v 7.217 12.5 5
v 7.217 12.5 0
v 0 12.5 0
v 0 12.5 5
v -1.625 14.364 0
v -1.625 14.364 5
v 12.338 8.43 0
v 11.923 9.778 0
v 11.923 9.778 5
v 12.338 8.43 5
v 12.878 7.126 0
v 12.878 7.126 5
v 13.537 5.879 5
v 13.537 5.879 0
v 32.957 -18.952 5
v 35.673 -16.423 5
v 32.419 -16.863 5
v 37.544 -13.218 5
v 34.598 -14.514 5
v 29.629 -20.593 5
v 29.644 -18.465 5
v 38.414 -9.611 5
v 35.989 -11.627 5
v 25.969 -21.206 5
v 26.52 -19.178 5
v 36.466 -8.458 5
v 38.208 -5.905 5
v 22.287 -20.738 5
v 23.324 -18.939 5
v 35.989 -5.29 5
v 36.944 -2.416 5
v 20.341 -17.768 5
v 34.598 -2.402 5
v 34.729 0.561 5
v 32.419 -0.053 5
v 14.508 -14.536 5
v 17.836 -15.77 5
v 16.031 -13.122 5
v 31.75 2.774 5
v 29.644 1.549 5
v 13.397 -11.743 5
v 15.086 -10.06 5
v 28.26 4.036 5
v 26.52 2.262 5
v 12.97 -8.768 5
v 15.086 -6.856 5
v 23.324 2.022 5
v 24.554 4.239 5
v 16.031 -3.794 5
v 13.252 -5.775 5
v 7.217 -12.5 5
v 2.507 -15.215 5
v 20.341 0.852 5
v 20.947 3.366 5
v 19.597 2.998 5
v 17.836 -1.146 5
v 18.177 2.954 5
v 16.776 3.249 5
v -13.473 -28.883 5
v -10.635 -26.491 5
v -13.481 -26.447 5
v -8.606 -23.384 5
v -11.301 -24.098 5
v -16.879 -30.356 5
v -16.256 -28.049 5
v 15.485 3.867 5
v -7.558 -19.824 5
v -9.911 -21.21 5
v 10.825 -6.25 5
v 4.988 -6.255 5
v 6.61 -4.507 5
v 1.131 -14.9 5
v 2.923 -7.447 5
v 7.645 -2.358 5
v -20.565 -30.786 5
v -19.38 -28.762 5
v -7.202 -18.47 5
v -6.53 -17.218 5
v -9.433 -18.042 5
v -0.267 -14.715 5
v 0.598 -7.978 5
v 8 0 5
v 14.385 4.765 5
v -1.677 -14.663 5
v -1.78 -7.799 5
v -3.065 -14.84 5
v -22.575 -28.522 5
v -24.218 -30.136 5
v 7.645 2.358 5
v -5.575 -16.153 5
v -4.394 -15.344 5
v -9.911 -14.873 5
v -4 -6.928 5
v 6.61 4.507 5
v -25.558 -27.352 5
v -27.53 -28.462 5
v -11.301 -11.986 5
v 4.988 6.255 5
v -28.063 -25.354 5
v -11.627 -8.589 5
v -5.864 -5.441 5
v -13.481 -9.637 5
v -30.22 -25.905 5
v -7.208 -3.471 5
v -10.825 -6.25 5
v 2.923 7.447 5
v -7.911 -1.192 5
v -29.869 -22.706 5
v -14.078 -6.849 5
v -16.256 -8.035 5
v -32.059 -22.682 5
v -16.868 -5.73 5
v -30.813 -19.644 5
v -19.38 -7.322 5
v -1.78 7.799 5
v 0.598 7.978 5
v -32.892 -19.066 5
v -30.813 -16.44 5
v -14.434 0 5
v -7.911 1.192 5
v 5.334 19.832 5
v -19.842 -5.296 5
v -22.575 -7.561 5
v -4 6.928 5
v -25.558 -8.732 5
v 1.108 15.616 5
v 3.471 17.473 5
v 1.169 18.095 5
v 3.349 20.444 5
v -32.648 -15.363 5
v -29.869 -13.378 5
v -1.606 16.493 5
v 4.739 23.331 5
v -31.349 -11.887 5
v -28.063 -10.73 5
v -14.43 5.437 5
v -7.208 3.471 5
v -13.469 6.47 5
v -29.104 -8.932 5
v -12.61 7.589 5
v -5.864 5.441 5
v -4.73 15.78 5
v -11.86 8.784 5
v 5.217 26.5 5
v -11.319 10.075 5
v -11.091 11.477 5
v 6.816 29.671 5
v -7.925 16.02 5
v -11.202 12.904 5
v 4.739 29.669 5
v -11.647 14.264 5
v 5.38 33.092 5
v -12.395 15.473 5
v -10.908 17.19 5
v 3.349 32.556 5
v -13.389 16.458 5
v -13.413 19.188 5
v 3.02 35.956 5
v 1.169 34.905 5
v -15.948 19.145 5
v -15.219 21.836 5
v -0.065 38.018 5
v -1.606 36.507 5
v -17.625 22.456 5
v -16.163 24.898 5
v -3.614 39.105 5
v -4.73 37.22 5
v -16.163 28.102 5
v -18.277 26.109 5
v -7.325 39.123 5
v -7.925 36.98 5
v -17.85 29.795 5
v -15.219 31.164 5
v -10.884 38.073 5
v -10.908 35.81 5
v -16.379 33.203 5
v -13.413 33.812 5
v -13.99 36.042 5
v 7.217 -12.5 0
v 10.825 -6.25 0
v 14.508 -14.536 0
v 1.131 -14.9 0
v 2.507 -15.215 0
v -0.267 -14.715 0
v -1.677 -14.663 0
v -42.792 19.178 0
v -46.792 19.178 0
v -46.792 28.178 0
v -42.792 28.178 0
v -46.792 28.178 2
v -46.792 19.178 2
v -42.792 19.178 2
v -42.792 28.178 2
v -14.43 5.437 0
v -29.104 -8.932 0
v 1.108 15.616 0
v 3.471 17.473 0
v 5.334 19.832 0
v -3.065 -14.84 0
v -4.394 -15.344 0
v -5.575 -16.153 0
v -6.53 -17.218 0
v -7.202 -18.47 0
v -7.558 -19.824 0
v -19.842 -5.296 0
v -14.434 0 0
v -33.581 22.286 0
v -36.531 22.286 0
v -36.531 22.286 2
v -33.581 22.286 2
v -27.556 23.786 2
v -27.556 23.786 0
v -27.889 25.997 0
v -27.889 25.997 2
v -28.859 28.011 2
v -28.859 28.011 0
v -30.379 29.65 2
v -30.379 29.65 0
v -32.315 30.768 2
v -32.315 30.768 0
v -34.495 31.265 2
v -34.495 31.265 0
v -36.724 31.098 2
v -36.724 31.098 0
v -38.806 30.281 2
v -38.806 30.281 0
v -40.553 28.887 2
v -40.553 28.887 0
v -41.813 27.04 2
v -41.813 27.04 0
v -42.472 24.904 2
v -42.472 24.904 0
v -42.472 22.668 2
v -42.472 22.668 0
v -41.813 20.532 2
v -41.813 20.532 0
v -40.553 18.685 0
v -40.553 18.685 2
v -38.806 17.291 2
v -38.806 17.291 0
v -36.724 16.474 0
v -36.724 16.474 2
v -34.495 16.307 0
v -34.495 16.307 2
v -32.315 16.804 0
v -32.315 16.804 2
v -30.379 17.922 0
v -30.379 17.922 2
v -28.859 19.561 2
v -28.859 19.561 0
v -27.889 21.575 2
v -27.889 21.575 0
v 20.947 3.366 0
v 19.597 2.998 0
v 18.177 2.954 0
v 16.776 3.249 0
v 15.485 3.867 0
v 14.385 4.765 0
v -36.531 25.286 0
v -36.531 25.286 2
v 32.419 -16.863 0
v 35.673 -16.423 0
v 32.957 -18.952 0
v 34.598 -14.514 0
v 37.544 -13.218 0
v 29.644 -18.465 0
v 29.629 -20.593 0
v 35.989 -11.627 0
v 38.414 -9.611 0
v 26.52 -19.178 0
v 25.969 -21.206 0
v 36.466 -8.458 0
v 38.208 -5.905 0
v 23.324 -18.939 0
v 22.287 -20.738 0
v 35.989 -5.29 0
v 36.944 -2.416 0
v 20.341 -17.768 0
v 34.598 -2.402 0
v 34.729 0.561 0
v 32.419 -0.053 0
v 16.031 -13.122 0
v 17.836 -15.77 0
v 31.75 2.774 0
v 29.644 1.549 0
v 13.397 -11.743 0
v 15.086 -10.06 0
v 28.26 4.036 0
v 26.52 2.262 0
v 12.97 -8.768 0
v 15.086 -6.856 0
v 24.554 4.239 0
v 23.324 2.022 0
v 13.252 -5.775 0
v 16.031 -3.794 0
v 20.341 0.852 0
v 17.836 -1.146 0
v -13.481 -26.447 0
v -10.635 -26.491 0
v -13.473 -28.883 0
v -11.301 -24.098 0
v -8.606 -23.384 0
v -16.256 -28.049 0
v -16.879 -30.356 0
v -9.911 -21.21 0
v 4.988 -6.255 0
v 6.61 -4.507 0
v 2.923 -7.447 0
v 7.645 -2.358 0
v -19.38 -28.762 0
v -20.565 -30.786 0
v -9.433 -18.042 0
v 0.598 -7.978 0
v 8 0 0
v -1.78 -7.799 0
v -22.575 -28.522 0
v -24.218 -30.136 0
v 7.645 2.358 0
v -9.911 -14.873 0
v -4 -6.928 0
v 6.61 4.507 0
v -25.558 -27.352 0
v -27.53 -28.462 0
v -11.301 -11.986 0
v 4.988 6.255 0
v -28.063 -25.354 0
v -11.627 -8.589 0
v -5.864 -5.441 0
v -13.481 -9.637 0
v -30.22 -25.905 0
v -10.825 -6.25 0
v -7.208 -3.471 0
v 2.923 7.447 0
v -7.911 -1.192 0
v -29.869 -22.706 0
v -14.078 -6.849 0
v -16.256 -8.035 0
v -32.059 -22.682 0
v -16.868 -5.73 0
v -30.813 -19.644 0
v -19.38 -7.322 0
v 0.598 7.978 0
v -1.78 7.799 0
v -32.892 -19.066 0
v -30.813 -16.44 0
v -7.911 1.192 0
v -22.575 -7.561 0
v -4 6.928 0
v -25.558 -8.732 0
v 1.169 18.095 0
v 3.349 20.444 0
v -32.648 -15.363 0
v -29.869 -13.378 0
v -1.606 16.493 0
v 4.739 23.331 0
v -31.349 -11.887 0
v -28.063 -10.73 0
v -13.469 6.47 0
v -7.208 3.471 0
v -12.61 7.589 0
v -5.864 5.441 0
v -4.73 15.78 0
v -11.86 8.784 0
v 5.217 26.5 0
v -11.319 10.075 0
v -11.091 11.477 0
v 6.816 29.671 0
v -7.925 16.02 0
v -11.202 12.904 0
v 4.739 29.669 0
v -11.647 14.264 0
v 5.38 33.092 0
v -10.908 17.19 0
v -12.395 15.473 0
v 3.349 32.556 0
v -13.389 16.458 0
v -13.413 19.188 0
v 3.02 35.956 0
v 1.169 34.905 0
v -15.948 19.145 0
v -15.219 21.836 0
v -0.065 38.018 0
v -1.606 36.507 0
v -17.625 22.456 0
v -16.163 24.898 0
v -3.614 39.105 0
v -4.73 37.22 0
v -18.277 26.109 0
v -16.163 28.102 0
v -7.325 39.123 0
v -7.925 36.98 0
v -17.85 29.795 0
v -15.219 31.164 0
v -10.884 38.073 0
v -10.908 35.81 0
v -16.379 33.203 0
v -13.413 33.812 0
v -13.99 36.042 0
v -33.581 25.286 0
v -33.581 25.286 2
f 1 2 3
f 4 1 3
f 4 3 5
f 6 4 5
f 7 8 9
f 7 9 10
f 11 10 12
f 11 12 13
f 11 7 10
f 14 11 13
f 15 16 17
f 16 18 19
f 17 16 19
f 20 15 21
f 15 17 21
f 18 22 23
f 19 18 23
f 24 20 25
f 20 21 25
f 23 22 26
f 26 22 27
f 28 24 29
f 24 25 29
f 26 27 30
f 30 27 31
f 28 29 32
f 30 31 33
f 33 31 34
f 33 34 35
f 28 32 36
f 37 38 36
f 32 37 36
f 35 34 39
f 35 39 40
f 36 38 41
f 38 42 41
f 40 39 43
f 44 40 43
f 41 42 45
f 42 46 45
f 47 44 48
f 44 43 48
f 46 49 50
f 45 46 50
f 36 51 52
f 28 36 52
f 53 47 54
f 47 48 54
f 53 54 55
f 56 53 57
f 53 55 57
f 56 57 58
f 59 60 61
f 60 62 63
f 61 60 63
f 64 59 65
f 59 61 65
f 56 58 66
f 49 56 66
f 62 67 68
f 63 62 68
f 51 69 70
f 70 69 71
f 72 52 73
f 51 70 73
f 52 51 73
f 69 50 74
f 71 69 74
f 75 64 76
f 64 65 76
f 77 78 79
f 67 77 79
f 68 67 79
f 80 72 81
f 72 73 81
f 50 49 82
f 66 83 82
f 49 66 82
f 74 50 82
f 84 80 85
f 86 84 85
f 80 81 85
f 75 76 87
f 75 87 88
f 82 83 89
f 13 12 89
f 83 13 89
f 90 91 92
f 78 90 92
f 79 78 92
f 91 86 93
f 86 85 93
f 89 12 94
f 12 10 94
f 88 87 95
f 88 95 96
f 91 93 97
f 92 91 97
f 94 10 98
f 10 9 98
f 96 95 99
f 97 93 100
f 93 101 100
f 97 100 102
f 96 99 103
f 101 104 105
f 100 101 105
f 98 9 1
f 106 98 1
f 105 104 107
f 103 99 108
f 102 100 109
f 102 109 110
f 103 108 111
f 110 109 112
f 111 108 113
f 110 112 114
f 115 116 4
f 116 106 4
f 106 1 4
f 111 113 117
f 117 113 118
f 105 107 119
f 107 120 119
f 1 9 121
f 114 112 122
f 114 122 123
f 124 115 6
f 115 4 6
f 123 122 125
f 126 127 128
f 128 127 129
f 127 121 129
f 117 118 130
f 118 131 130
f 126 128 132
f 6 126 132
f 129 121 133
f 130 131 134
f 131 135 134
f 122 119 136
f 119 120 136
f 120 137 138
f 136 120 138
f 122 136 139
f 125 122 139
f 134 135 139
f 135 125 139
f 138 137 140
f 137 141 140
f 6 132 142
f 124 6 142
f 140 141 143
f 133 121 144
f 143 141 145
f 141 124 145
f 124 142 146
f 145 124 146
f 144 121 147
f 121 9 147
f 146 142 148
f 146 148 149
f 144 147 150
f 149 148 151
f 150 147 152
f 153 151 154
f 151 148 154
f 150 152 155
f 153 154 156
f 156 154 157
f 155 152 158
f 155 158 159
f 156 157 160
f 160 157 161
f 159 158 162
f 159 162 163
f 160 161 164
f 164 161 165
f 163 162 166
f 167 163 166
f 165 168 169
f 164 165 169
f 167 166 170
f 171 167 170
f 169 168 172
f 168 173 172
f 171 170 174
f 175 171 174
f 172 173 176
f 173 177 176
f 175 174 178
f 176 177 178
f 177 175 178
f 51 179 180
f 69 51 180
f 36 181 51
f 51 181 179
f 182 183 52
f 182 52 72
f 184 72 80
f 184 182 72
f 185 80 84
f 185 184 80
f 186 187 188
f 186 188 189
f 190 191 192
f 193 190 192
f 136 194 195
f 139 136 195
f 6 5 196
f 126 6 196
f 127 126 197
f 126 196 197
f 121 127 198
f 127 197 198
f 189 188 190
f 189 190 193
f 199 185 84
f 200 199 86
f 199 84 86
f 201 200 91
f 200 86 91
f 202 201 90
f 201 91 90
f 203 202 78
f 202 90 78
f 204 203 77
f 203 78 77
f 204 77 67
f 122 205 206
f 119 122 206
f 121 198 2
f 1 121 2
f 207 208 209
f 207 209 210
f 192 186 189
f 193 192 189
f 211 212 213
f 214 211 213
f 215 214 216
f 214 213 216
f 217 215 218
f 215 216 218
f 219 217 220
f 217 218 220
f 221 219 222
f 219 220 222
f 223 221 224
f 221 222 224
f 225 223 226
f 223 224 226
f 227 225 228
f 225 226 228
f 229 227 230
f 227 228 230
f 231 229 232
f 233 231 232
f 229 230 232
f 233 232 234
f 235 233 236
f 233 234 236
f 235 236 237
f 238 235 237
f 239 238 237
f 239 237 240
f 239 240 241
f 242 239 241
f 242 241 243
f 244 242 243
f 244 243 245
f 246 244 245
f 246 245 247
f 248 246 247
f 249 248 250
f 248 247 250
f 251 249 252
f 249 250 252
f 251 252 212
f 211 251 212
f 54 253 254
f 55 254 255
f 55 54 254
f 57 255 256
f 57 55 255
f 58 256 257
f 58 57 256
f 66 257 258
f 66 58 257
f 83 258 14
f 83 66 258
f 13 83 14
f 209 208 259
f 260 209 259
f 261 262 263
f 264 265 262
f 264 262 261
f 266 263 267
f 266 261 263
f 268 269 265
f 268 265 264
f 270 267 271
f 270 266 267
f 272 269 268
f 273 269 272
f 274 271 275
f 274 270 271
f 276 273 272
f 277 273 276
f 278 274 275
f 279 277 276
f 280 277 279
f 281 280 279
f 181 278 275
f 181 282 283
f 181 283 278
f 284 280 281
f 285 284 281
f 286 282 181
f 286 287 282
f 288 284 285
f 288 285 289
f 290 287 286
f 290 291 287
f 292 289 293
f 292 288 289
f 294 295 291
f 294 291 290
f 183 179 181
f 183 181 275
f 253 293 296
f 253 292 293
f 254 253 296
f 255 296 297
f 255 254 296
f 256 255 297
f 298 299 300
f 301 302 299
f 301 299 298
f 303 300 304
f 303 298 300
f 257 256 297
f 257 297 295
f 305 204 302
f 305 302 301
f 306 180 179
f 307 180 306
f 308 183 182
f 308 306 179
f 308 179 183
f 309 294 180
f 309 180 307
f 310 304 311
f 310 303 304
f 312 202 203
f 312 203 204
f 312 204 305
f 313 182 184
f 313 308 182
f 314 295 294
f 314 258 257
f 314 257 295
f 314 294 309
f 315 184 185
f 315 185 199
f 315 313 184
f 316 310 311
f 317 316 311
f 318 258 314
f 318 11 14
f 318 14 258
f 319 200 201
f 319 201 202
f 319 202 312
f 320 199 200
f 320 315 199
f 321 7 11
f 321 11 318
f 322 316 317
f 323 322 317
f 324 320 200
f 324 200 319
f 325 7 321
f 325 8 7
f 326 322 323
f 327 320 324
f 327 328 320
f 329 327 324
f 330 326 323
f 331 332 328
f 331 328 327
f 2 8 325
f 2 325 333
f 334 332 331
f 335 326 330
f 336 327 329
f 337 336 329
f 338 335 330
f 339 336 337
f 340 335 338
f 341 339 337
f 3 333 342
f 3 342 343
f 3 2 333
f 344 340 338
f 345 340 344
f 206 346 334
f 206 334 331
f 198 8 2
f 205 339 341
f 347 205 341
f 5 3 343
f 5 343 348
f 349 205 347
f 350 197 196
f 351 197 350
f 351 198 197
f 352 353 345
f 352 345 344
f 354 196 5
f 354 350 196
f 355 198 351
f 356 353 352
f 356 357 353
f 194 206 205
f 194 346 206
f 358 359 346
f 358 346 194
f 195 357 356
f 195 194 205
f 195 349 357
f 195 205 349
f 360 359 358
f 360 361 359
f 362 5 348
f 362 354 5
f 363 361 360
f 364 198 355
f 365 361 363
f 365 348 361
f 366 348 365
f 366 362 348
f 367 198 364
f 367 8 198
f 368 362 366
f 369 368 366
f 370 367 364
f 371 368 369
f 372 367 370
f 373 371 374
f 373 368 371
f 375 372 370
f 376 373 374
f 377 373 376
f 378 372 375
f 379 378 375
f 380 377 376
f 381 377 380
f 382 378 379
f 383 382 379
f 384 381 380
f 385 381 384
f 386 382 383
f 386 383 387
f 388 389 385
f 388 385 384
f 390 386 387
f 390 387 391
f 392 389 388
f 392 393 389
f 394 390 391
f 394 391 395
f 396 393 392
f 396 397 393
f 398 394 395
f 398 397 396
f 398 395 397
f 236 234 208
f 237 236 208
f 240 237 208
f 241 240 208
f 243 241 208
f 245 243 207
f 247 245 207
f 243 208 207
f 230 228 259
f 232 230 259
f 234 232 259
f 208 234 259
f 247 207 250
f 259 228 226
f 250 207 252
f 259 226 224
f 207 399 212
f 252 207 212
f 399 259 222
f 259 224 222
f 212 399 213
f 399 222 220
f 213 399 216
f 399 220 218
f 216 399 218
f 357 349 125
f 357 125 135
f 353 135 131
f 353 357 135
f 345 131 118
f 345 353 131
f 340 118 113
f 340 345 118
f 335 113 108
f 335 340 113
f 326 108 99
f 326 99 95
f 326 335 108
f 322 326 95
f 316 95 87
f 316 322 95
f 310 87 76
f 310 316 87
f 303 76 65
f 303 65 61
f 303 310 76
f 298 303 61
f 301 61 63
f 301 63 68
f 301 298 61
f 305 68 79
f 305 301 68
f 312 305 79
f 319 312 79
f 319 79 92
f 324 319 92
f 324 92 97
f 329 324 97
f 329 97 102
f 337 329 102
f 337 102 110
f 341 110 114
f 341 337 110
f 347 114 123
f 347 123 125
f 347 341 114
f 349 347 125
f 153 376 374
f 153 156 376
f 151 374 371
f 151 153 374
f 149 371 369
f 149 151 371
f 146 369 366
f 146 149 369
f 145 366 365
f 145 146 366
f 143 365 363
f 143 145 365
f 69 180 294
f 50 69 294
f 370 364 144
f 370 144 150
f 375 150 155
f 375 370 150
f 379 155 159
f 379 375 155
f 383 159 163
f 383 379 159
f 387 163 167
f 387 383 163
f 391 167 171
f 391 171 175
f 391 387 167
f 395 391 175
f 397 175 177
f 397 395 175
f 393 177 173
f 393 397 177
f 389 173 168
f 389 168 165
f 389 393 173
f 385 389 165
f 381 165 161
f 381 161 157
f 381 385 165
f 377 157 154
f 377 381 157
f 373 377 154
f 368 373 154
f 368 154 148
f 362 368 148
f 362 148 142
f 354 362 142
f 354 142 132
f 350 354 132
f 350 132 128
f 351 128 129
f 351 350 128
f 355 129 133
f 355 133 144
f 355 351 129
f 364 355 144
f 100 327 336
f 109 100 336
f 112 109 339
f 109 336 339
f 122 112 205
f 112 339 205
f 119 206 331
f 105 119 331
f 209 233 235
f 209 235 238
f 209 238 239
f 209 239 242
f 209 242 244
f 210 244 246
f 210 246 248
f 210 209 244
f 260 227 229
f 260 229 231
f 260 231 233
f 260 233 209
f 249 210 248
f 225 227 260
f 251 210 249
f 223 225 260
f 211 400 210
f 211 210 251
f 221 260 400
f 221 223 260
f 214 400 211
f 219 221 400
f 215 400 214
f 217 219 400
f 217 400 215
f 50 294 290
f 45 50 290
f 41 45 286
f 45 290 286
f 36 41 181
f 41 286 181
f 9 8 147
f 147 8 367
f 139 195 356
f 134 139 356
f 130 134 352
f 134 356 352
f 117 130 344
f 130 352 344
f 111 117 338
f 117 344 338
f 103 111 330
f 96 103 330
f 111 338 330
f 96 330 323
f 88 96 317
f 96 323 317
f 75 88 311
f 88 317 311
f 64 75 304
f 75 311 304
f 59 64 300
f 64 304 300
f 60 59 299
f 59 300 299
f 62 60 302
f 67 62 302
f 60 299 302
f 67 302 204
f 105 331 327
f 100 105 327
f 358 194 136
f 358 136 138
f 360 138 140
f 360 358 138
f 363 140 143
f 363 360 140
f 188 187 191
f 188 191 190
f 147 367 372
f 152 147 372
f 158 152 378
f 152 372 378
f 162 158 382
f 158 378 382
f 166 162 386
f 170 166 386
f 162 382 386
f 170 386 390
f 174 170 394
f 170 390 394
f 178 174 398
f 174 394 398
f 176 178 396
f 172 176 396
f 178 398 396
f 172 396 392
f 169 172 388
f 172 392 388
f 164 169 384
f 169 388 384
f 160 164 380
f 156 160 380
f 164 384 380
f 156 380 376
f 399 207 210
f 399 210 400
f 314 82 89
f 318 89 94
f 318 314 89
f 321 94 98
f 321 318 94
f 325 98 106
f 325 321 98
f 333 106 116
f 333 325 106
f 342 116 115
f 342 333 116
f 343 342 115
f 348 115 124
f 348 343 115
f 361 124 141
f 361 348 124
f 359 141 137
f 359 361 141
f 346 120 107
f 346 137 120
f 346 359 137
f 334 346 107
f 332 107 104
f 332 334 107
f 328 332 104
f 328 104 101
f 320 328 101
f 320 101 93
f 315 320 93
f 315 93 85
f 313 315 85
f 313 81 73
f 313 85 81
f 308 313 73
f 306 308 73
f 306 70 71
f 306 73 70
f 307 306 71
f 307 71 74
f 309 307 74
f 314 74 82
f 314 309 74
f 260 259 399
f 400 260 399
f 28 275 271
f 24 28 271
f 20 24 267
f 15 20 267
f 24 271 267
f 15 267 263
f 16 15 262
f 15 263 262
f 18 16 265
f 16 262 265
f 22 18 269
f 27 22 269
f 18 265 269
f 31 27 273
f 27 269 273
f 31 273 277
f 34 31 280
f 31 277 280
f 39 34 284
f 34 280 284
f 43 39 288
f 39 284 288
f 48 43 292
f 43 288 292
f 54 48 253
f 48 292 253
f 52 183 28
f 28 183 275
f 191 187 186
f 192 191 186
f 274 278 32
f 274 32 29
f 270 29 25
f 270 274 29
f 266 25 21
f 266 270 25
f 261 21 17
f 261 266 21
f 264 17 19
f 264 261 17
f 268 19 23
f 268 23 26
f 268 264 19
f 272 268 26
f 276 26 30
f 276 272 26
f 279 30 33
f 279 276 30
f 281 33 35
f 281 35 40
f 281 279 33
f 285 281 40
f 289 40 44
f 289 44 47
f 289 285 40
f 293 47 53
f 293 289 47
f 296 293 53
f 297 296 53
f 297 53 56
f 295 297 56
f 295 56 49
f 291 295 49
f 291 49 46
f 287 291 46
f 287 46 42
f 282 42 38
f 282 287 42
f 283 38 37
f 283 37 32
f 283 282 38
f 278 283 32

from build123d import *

# Parameters (mm, degrees)
F0_R        = 8
F1_DEPTH    = 5
F0_R_2      = 10.75
F2_DEPTH    = 5
F3_COUNT    = 3
F4_T1_DEPTH = 5
F5_W        = 4
F5_H        = 9
F6_DEPTH    = 2
F5_R        = 7.5
F5_W_2      = 2.95
F5_H_2      = 3
F7_R        = 6


# Not quite as in the source:
# - a fillet or chamfer that OpenCascade refuses, or shapes differently, is made with other operations: its cross-section is extruded or revolved along the edge and cut away or added
# - a feature names something its author has since deleted; it is built from what else it names


with BuildPart() as f1:
    # F0 (on Top) → F1 (new body)
    with BuildSketch(Plane.XY):
        Polygon((0, 12.5), (-7.2168783649, 12.5), (-14.4337567297, 0), (-7.2168783649, -12.5), (7.2168783649, -12.5), (14.4337567297, 0), (7.2168783649, 12.5), align=None)
        Circle(F0_R, mode=Mode.SUBTRACT)
    extrude(amount=F1_DEPTH)

    # F0 (on Top) → F2 (join)
    with BuildSketch(Plane.XY):
        with BuildLine():
            Line((-10.0093687347, 14.5615867092), (-7.2168783649, 12.5))
            Line((-7.2168783649, 12.5), (0, 12.5))
            Line((0, 12.5), (-1.6247319688, 14.3638148409))
            ThreePointArc((-1.6247319688, 14.3638148409), (2.3445854374, 16.4748201373), (5.3344467629, 19.8322824659))
            Line((5.3344467629, 19.8322824659), (7.2168783649, 12.5))
            Line((7.2168783649, 12.5), (14.4337567297, 0))
            Line((14.4337567297, 0), (6.8163861068, 29.6705139226))
            ThreePointArc((6.8163861068, 29.6705139226), (-14.0517470331, 35.9865969309), (-10.0093687347, 14.5615867092))
        make_face()
        with Locations((-5.5331216351, 26.5)):
            Circle(F0_R_2, mode=Mode.SUBTRACT)
    extrude(amount=F2_DEPTH)

    # F3: F1 ×3 about axis
    f3_axis = Axis((0, 0, 0), (0, 0, 1))


with BuildPart() as f1_1:
    add(f1.part)
    for i in range(1, F3_COUNT):
        add(f1.part.rotate(f3_axis, i * 360 / F3_COUNT))

    # F4: fillet of radius 15 on 3 edges, made by hand

    # F4_s2 → F4_t1 (join)
    with BuildSketch(Plane.XY):
        with BuildLine():
            ThreePointArc((2.5065087004, -15.21505791), (-2.6136621593, -14.7017722607), (-7.6060196422, -15.9491609547))
            Line((-7.6060196422, -15.9491609547), (-7.2168783649, -12.5))
            Line((-7.2168783649, -12.5), (2.5065087004, -15.21505791))
        make_face()
        with BuildLine():
            ThreePointArc((-14.4298810204, 5.4368287457), (-11.4252771788, 9.6143839572), (-10.0093687348, 14.5615867092))
            Line((-10.0093687348, 14.5615867092), (-7.2168783649, 12.5))
            Line((-7.2168783649, 12.5), (-14.4298810204, 5.4368287457))
        make_face()
        with BuildLine():
            ThreePointArc((11.92337232, 9.7782291644), (14.0389393381, 5.0873883035), (17.6153883769, 1.3875742456))
            Line((17.6153883769, 1.3875742456), (14.4337567297, 0))
            Line((14.4337567297, 0), (11.92337232, 9.7782291644))
        make_face()
    extrude(amount=F4_T1_DEPTH)

    # F7
    f7_edges = [f1_1.edges().sort_by_distance(p)[0] for p in [
        (-10.009369, 14.561587, 2.5),
        (17.615388, 1.387574, 2.5),
        (-7.60602, -15.949161, 2.5),
    ]]
    fillet(f7_edges, radius=F7_R)


with BuildPart() as f6:
    # F5 (on Top) → F6 (new body)
    with BuildSketch(Plane.XY):
        with Locations((-44.7917245328, 23.6781613976)):
            Rectangle(F5_W, F5_H)
    extrude(amount=F6_DEPTH)


with BuildPart() as f6b:
    # F5 (on Top) → F6, piece 2 (new body)
    with BuildSketch(Plane.XY):
        with Locations((-35.0555505693, 23.7860276699)):
            Circle(F5_R)
        with Locations((-35.0555505693, 23.7860276699)):
            Rectangle(F5_W_2, F5_H_2, mode=Mode.SUBTRACT)
    extrude(amount=F6_DEPTH)


solid = Compound([f1_1.part, f6.part, f6b.part])
